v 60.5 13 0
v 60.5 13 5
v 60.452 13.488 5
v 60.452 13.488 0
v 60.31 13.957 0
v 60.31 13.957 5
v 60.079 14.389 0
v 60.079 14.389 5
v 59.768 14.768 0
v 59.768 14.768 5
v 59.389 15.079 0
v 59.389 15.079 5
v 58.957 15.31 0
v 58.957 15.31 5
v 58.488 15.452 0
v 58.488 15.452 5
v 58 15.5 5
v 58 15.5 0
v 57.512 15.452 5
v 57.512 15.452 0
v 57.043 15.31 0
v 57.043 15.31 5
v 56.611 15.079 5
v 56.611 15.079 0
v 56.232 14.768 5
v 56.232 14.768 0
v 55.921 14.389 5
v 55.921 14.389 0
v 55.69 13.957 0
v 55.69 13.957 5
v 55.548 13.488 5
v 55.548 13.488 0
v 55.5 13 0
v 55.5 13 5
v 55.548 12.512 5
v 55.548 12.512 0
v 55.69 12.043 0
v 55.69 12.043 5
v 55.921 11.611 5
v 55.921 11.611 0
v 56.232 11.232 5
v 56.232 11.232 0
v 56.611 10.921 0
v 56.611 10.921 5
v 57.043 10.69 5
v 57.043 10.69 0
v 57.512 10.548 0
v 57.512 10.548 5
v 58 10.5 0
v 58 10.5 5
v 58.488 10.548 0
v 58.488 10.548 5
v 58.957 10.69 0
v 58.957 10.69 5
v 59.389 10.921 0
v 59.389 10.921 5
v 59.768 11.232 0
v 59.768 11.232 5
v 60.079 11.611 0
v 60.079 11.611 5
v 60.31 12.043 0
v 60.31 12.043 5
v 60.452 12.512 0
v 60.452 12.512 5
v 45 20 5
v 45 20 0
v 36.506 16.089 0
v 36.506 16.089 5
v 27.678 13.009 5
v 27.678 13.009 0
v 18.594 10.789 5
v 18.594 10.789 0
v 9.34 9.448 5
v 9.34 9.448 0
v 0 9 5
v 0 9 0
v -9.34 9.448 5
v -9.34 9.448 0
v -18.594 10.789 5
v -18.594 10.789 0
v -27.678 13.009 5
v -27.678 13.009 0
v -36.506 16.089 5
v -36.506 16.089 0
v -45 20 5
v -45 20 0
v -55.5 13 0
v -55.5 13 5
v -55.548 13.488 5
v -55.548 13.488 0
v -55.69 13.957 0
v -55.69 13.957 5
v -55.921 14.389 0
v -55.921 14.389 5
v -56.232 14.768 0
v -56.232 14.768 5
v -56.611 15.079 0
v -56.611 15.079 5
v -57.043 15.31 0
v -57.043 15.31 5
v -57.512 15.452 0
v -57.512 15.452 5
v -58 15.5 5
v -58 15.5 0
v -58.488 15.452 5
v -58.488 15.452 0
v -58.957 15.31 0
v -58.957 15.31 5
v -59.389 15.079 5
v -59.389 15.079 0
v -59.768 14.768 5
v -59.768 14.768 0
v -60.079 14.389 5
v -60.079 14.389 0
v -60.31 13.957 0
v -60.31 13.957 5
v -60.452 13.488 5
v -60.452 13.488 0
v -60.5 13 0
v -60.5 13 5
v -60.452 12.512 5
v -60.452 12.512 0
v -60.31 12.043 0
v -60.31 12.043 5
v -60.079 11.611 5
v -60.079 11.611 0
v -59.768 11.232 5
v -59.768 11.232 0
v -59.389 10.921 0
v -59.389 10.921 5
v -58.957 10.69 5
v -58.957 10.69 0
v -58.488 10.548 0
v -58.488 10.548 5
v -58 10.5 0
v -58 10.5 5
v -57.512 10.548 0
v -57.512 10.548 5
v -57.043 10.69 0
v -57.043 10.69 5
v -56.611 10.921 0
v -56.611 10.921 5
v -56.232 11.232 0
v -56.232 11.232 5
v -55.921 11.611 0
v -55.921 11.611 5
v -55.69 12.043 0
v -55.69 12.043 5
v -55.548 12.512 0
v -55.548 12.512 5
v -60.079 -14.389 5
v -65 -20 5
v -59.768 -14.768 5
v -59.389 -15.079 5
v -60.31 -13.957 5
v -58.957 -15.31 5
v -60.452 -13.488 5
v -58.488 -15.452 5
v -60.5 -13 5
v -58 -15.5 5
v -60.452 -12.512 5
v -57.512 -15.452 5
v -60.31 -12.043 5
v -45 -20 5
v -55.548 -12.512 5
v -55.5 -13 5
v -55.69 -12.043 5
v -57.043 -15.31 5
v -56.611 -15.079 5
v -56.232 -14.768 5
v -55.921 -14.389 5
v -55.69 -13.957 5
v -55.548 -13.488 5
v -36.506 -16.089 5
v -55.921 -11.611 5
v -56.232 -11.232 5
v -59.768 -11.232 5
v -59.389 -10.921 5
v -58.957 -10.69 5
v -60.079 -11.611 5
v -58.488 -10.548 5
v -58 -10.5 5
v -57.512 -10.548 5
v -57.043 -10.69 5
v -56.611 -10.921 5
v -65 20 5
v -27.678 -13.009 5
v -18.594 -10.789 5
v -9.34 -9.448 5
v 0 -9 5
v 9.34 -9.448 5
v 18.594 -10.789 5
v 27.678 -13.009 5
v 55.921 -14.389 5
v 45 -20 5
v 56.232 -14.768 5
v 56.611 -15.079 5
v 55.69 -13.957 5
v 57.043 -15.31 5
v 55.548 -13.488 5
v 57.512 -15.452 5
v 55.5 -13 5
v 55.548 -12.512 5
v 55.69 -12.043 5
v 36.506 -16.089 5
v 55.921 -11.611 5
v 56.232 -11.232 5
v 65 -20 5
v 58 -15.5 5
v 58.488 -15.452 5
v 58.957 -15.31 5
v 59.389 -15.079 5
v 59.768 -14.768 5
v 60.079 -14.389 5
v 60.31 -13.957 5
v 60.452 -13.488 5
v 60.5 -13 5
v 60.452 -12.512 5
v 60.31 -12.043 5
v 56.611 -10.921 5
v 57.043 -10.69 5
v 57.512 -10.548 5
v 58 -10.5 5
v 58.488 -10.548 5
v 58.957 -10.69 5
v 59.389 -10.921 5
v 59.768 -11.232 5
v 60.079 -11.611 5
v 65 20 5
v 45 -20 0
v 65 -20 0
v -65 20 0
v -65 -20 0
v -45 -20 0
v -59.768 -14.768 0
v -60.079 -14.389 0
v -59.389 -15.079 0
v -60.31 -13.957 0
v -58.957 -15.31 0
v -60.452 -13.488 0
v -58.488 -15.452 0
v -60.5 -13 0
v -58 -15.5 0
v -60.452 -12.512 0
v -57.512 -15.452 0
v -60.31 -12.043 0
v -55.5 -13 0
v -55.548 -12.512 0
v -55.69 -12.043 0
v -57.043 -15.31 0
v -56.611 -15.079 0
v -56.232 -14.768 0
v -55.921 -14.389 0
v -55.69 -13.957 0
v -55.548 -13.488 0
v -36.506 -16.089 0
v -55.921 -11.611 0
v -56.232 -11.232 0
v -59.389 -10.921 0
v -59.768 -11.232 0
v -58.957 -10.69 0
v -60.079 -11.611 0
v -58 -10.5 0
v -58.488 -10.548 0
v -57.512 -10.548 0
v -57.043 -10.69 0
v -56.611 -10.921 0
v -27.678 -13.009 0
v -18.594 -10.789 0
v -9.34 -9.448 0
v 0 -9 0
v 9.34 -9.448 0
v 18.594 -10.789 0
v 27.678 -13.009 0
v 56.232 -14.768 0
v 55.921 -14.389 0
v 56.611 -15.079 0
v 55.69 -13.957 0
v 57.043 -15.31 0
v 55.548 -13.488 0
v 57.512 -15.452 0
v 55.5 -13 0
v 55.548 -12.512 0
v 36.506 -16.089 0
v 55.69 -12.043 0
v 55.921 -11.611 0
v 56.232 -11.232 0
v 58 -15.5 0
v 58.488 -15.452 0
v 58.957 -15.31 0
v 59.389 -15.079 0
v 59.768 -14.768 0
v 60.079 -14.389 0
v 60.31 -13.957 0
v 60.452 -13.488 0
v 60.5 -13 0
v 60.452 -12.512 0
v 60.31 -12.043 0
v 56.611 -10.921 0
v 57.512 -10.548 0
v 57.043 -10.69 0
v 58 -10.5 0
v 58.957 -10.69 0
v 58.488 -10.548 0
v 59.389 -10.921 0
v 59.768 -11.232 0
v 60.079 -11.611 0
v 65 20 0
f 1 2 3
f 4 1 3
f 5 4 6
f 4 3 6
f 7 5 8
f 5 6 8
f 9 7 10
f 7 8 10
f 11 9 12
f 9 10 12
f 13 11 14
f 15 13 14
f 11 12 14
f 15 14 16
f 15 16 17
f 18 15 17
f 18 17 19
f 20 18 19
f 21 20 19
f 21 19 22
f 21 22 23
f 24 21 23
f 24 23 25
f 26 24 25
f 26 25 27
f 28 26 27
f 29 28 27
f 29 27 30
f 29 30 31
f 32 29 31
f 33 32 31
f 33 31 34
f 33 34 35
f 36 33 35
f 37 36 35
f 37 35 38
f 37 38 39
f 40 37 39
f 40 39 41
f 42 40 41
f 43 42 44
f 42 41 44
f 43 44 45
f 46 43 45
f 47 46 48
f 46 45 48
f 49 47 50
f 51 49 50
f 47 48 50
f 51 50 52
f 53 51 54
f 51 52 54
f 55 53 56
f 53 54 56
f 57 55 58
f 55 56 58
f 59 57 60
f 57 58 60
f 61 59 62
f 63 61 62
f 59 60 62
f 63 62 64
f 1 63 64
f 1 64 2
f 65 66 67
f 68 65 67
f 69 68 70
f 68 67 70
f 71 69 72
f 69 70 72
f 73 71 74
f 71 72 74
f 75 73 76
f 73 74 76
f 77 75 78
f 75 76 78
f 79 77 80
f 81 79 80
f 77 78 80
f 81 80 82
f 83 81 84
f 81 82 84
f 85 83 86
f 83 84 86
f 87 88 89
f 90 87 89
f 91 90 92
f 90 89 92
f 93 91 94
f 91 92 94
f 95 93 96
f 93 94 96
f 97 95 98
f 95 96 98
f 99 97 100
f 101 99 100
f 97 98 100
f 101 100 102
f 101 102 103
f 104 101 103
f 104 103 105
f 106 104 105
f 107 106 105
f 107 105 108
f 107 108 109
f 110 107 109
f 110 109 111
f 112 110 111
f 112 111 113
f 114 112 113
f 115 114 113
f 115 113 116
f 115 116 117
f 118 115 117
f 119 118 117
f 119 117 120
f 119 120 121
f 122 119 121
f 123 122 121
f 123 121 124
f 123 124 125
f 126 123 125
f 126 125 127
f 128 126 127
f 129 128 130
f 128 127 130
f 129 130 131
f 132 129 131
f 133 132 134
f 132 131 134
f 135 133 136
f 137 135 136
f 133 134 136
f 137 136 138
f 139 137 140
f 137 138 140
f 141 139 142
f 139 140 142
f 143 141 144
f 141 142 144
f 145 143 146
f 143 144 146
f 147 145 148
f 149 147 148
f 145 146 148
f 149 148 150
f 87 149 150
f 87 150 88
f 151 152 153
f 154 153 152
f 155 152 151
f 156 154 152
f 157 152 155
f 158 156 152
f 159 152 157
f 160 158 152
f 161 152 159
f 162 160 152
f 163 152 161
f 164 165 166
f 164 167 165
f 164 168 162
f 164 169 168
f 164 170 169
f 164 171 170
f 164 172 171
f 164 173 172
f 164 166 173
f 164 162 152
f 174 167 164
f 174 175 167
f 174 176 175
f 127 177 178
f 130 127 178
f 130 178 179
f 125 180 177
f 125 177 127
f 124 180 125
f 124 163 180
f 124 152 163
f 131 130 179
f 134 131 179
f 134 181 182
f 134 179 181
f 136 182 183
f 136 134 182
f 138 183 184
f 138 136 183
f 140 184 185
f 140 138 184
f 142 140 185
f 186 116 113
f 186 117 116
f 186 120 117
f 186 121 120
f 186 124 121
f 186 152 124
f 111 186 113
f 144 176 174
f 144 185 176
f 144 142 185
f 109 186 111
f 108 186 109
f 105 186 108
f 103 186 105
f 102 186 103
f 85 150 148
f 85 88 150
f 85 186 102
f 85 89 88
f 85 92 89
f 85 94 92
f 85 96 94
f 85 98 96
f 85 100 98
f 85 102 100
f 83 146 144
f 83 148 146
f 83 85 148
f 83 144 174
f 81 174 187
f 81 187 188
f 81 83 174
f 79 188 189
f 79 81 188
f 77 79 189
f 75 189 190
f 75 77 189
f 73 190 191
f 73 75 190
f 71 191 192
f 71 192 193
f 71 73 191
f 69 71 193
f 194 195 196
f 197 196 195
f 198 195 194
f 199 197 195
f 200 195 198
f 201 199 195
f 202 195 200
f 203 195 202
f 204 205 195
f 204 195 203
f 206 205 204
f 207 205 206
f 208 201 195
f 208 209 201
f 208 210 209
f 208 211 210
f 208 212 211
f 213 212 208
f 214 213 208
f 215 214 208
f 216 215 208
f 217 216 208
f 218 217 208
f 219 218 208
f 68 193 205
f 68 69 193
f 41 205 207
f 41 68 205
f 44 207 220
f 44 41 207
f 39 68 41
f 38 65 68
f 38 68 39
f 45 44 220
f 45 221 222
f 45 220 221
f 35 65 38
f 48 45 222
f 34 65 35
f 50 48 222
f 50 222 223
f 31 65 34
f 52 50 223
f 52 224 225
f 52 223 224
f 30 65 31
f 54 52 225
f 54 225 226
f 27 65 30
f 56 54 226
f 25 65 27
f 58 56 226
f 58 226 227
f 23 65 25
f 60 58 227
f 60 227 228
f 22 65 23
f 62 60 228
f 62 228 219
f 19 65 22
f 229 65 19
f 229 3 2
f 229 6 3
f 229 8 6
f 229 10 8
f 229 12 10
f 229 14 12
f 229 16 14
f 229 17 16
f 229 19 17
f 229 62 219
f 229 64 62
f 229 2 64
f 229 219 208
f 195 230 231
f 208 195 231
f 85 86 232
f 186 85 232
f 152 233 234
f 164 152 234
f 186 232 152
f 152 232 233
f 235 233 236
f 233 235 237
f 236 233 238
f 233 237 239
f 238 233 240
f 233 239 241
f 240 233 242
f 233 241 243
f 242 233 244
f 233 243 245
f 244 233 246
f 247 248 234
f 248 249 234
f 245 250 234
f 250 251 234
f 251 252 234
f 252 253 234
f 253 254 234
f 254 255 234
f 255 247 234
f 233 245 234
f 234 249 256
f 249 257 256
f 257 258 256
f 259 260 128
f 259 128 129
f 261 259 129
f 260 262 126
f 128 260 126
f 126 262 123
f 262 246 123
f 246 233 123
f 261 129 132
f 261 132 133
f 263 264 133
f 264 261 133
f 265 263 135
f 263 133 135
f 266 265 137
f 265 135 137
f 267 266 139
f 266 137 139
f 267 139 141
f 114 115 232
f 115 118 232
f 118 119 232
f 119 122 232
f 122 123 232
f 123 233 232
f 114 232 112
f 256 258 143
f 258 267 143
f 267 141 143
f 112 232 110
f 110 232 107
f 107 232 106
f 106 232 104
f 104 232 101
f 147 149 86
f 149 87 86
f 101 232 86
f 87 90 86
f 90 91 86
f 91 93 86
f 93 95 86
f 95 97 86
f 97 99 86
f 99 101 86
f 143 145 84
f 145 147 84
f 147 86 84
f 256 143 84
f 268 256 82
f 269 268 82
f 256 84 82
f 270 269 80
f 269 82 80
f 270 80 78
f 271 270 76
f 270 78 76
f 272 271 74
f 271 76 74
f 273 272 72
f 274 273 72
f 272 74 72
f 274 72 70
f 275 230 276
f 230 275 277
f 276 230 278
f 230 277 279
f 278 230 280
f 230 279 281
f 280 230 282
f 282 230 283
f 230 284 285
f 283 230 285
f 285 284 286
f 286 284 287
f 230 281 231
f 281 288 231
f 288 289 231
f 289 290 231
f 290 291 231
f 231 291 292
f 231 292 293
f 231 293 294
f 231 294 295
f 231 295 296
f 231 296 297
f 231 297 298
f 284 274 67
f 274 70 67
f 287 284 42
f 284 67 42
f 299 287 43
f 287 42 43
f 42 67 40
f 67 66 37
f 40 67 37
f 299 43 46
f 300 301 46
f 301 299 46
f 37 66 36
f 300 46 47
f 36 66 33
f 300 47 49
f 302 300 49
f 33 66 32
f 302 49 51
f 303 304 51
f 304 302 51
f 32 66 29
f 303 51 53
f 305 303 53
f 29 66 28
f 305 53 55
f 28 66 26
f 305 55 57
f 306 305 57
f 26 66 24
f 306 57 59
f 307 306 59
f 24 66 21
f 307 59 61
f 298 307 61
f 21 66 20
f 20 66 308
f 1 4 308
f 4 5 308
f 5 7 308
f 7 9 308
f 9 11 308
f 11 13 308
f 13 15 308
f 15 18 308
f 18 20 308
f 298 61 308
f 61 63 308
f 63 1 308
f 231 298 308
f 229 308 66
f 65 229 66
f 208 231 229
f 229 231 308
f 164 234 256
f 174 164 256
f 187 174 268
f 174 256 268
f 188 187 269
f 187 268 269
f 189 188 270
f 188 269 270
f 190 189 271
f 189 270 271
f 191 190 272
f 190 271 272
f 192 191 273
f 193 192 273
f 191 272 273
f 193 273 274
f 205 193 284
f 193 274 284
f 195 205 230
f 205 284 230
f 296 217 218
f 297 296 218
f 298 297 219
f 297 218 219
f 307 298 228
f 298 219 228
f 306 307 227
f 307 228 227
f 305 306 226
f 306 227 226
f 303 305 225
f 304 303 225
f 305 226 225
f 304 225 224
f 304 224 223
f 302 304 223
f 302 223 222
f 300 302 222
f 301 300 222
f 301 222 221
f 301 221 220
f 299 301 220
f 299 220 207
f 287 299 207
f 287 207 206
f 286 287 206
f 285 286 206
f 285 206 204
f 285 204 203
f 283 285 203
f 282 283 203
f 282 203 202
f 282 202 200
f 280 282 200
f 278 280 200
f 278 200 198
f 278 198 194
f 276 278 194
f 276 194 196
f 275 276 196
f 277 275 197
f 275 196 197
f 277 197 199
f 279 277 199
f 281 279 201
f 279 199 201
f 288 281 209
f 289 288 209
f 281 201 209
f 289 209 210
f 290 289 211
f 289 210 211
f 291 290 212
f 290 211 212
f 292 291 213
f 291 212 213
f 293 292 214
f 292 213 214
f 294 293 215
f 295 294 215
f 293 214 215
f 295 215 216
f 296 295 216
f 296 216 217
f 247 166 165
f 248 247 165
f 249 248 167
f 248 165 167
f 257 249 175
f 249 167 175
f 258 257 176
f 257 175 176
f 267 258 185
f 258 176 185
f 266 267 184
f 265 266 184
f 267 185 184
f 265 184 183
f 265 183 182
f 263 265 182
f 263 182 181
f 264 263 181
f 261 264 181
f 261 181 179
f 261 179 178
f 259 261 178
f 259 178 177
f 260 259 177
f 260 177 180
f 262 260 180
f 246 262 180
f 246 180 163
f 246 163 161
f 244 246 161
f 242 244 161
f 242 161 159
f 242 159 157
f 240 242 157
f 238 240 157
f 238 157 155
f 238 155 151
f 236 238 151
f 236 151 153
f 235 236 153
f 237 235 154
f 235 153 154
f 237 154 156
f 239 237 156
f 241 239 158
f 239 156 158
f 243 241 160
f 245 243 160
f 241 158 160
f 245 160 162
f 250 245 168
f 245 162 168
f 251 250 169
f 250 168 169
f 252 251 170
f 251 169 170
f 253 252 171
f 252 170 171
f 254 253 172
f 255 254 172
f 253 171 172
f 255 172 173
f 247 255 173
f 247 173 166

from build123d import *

# Parameters (mm, degrees)
F1_DEPTH = 5
F2_R     = 2.5
F3_DEPTH = 5.001


with BuildPart() as f1:
    # F0 (on Top) → F1 (new body)
    with BuildSketch(Plane.XY):
        with BuildLine():
            Line((-45, 20), (-65, 20))
            Line((-65, 20), (-65, -20))
            Line((-65, -20), (-45, -20))
            ThreePointArc((-45, -20), (0, -9), (45, -20))
            Line((45, -20), (65, -20))
            Line((65, -20), (65, 20))
            Line((65, 20), (45, 20))
            ThreePointArc((45, 20), (0, 9), (-45, 20))
        make_face()
    extrude(amount=F1_DEPTH)

    # F2 (on face) → F3 (cut, through all)
    with BuildSketch(Plane.XY.offset(5)):
        with Locations((-58, 13)):
            Circle(F2_R)
        with Locations((-58, -13)):
            Circle(F2_R)
        with Locations((58, 13)):
            Circle(F2_R)
        with Locations((58, -13)):
            Circle(F2_R)
    extrude(amount=-F3_DEPTH, mode=Mode.SUBTRACT)


solid = f1.part
